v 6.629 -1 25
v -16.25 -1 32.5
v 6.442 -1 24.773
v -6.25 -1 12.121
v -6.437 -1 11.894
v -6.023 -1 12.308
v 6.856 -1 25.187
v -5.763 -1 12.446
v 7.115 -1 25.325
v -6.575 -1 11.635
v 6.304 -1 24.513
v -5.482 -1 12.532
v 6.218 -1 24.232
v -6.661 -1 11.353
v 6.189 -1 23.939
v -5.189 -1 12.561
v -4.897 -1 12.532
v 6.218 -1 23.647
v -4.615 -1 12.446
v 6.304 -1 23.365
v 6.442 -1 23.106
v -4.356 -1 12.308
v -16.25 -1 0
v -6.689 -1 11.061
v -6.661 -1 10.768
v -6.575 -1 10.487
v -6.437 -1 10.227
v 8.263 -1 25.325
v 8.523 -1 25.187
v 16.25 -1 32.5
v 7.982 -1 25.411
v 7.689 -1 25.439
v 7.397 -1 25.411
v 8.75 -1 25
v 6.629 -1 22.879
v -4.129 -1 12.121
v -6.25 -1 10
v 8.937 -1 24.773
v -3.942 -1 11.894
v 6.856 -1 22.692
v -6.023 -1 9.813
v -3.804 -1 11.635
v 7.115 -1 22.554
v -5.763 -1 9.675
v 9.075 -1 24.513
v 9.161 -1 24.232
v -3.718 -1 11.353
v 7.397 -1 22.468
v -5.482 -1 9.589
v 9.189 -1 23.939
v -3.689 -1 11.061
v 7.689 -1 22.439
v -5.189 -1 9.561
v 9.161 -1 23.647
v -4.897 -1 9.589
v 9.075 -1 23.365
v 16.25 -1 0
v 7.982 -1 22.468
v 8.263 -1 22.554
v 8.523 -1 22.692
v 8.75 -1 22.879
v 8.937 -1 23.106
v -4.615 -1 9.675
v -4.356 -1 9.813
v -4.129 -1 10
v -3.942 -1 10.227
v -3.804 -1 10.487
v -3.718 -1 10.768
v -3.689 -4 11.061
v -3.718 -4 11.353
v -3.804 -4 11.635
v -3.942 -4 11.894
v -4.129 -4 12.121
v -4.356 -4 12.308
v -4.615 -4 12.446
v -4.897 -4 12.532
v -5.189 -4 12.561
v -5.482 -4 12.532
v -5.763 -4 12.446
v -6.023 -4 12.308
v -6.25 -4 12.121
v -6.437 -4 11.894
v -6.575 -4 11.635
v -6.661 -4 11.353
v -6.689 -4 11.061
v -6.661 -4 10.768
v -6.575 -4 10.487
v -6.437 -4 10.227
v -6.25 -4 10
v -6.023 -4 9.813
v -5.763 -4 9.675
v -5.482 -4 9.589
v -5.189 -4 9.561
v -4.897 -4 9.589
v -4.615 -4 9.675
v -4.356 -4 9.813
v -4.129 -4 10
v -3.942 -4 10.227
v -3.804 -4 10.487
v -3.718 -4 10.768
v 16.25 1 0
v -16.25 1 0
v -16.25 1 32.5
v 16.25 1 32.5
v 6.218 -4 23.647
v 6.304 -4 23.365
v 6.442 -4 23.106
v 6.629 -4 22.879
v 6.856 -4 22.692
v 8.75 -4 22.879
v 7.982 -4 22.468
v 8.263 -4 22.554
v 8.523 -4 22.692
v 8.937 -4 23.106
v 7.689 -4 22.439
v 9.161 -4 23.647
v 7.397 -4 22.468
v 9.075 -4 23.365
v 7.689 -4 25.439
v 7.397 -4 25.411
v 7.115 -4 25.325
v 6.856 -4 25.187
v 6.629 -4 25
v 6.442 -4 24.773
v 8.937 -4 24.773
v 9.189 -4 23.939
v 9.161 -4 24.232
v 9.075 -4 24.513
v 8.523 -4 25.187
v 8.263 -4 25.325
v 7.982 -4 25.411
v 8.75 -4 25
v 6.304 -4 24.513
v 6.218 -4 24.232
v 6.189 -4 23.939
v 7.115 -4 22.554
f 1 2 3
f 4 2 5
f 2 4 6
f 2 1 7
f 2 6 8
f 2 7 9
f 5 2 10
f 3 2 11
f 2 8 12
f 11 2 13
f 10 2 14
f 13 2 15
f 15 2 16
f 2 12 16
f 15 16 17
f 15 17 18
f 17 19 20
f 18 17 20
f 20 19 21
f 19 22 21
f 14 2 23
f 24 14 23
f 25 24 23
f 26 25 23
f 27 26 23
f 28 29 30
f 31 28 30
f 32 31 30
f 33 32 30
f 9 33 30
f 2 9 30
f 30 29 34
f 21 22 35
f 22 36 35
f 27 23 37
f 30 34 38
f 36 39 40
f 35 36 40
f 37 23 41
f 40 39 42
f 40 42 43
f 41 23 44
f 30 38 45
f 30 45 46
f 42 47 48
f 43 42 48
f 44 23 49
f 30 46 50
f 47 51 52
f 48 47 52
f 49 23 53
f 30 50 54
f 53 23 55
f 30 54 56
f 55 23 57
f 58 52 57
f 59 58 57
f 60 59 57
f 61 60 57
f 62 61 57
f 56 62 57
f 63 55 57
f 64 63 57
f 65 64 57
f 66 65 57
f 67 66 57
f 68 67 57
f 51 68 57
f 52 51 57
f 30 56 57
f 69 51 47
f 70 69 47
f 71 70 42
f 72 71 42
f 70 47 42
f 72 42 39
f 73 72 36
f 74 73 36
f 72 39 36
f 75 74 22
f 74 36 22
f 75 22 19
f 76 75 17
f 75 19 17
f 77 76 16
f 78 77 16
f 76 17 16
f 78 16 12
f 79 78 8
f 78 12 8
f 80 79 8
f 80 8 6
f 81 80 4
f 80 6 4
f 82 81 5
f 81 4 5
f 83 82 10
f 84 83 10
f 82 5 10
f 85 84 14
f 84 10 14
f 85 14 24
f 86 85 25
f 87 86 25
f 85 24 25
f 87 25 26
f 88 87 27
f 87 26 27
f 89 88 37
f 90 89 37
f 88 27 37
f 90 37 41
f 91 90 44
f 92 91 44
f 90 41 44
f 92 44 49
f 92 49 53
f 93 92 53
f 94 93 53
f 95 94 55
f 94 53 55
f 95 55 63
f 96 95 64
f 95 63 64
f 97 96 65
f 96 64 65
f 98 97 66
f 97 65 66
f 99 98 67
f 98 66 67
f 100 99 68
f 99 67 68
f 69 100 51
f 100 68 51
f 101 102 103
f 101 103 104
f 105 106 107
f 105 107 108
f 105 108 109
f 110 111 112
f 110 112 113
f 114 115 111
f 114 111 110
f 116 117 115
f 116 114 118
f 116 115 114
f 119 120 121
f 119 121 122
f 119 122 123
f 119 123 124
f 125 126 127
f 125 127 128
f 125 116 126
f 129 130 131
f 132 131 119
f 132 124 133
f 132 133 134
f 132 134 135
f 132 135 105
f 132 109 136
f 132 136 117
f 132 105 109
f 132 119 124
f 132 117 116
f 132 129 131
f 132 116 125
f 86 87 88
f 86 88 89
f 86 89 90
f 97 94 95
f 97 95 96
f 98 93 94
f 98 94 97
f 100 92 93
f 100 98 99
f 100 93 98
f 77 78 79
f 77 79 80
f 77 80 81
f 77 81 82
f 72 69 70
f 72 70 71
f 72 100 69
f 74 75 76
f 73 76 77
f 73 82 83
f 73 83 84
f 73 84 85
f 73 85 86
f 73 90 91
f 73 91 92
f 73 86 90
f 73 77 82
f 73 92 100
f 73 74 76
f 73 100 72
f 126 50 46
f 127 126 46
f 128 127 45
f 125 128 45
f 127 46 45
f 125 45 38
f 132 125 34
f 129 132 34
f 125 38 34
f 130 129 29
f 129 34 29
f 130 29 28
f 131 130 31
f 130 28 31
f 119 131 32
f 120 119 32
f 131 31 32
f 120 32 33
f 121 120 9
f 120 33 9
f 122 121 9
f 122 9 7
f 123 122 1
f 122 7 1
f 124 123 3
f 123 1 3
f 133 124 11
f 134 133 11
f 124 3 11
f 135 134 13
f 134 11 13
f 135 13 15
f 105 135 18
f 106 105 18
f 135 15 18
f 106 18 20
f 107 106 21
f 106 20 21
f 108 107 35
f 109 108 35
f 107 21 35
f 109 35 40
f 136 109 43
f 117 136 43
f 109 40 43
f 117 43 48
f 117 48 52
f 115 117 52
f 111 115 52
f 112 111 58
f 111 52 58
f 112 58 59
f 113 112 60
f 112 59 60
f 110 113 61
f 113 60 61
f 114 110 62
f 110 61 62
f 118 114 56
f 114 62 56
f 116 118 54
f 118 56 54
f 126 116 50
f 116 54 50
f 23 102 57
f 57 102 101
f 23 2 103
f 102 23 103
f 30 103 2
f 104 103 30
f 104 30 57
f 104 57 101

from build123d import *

# Parameters (mm, degrees)
F0_W     = 32.5
F0_H     = 2
F1_DEPTH = 32.5
F2_R     = 1.5
F3_DEPTH = 3


with BuildPart() as f1:
    # F0 (on Top) → F1 (new body)
    with BuildSketch(Plane.XY):
        Rectangle(F0_W, F0_H)
    extrude(amount=F1_DEPTH)

    # F2 (on face) → F3 (join)
    with BuildSketch(Plane.XZ.offset(1)):
        with Locations((-5.18934, 11.06066)):
            Circle(F2_R)
        with Locations((7.68934, 23.93934)):
            Circle(F2_R)
    extrude(amount=F3_DEPTH)


solid = f1.part
